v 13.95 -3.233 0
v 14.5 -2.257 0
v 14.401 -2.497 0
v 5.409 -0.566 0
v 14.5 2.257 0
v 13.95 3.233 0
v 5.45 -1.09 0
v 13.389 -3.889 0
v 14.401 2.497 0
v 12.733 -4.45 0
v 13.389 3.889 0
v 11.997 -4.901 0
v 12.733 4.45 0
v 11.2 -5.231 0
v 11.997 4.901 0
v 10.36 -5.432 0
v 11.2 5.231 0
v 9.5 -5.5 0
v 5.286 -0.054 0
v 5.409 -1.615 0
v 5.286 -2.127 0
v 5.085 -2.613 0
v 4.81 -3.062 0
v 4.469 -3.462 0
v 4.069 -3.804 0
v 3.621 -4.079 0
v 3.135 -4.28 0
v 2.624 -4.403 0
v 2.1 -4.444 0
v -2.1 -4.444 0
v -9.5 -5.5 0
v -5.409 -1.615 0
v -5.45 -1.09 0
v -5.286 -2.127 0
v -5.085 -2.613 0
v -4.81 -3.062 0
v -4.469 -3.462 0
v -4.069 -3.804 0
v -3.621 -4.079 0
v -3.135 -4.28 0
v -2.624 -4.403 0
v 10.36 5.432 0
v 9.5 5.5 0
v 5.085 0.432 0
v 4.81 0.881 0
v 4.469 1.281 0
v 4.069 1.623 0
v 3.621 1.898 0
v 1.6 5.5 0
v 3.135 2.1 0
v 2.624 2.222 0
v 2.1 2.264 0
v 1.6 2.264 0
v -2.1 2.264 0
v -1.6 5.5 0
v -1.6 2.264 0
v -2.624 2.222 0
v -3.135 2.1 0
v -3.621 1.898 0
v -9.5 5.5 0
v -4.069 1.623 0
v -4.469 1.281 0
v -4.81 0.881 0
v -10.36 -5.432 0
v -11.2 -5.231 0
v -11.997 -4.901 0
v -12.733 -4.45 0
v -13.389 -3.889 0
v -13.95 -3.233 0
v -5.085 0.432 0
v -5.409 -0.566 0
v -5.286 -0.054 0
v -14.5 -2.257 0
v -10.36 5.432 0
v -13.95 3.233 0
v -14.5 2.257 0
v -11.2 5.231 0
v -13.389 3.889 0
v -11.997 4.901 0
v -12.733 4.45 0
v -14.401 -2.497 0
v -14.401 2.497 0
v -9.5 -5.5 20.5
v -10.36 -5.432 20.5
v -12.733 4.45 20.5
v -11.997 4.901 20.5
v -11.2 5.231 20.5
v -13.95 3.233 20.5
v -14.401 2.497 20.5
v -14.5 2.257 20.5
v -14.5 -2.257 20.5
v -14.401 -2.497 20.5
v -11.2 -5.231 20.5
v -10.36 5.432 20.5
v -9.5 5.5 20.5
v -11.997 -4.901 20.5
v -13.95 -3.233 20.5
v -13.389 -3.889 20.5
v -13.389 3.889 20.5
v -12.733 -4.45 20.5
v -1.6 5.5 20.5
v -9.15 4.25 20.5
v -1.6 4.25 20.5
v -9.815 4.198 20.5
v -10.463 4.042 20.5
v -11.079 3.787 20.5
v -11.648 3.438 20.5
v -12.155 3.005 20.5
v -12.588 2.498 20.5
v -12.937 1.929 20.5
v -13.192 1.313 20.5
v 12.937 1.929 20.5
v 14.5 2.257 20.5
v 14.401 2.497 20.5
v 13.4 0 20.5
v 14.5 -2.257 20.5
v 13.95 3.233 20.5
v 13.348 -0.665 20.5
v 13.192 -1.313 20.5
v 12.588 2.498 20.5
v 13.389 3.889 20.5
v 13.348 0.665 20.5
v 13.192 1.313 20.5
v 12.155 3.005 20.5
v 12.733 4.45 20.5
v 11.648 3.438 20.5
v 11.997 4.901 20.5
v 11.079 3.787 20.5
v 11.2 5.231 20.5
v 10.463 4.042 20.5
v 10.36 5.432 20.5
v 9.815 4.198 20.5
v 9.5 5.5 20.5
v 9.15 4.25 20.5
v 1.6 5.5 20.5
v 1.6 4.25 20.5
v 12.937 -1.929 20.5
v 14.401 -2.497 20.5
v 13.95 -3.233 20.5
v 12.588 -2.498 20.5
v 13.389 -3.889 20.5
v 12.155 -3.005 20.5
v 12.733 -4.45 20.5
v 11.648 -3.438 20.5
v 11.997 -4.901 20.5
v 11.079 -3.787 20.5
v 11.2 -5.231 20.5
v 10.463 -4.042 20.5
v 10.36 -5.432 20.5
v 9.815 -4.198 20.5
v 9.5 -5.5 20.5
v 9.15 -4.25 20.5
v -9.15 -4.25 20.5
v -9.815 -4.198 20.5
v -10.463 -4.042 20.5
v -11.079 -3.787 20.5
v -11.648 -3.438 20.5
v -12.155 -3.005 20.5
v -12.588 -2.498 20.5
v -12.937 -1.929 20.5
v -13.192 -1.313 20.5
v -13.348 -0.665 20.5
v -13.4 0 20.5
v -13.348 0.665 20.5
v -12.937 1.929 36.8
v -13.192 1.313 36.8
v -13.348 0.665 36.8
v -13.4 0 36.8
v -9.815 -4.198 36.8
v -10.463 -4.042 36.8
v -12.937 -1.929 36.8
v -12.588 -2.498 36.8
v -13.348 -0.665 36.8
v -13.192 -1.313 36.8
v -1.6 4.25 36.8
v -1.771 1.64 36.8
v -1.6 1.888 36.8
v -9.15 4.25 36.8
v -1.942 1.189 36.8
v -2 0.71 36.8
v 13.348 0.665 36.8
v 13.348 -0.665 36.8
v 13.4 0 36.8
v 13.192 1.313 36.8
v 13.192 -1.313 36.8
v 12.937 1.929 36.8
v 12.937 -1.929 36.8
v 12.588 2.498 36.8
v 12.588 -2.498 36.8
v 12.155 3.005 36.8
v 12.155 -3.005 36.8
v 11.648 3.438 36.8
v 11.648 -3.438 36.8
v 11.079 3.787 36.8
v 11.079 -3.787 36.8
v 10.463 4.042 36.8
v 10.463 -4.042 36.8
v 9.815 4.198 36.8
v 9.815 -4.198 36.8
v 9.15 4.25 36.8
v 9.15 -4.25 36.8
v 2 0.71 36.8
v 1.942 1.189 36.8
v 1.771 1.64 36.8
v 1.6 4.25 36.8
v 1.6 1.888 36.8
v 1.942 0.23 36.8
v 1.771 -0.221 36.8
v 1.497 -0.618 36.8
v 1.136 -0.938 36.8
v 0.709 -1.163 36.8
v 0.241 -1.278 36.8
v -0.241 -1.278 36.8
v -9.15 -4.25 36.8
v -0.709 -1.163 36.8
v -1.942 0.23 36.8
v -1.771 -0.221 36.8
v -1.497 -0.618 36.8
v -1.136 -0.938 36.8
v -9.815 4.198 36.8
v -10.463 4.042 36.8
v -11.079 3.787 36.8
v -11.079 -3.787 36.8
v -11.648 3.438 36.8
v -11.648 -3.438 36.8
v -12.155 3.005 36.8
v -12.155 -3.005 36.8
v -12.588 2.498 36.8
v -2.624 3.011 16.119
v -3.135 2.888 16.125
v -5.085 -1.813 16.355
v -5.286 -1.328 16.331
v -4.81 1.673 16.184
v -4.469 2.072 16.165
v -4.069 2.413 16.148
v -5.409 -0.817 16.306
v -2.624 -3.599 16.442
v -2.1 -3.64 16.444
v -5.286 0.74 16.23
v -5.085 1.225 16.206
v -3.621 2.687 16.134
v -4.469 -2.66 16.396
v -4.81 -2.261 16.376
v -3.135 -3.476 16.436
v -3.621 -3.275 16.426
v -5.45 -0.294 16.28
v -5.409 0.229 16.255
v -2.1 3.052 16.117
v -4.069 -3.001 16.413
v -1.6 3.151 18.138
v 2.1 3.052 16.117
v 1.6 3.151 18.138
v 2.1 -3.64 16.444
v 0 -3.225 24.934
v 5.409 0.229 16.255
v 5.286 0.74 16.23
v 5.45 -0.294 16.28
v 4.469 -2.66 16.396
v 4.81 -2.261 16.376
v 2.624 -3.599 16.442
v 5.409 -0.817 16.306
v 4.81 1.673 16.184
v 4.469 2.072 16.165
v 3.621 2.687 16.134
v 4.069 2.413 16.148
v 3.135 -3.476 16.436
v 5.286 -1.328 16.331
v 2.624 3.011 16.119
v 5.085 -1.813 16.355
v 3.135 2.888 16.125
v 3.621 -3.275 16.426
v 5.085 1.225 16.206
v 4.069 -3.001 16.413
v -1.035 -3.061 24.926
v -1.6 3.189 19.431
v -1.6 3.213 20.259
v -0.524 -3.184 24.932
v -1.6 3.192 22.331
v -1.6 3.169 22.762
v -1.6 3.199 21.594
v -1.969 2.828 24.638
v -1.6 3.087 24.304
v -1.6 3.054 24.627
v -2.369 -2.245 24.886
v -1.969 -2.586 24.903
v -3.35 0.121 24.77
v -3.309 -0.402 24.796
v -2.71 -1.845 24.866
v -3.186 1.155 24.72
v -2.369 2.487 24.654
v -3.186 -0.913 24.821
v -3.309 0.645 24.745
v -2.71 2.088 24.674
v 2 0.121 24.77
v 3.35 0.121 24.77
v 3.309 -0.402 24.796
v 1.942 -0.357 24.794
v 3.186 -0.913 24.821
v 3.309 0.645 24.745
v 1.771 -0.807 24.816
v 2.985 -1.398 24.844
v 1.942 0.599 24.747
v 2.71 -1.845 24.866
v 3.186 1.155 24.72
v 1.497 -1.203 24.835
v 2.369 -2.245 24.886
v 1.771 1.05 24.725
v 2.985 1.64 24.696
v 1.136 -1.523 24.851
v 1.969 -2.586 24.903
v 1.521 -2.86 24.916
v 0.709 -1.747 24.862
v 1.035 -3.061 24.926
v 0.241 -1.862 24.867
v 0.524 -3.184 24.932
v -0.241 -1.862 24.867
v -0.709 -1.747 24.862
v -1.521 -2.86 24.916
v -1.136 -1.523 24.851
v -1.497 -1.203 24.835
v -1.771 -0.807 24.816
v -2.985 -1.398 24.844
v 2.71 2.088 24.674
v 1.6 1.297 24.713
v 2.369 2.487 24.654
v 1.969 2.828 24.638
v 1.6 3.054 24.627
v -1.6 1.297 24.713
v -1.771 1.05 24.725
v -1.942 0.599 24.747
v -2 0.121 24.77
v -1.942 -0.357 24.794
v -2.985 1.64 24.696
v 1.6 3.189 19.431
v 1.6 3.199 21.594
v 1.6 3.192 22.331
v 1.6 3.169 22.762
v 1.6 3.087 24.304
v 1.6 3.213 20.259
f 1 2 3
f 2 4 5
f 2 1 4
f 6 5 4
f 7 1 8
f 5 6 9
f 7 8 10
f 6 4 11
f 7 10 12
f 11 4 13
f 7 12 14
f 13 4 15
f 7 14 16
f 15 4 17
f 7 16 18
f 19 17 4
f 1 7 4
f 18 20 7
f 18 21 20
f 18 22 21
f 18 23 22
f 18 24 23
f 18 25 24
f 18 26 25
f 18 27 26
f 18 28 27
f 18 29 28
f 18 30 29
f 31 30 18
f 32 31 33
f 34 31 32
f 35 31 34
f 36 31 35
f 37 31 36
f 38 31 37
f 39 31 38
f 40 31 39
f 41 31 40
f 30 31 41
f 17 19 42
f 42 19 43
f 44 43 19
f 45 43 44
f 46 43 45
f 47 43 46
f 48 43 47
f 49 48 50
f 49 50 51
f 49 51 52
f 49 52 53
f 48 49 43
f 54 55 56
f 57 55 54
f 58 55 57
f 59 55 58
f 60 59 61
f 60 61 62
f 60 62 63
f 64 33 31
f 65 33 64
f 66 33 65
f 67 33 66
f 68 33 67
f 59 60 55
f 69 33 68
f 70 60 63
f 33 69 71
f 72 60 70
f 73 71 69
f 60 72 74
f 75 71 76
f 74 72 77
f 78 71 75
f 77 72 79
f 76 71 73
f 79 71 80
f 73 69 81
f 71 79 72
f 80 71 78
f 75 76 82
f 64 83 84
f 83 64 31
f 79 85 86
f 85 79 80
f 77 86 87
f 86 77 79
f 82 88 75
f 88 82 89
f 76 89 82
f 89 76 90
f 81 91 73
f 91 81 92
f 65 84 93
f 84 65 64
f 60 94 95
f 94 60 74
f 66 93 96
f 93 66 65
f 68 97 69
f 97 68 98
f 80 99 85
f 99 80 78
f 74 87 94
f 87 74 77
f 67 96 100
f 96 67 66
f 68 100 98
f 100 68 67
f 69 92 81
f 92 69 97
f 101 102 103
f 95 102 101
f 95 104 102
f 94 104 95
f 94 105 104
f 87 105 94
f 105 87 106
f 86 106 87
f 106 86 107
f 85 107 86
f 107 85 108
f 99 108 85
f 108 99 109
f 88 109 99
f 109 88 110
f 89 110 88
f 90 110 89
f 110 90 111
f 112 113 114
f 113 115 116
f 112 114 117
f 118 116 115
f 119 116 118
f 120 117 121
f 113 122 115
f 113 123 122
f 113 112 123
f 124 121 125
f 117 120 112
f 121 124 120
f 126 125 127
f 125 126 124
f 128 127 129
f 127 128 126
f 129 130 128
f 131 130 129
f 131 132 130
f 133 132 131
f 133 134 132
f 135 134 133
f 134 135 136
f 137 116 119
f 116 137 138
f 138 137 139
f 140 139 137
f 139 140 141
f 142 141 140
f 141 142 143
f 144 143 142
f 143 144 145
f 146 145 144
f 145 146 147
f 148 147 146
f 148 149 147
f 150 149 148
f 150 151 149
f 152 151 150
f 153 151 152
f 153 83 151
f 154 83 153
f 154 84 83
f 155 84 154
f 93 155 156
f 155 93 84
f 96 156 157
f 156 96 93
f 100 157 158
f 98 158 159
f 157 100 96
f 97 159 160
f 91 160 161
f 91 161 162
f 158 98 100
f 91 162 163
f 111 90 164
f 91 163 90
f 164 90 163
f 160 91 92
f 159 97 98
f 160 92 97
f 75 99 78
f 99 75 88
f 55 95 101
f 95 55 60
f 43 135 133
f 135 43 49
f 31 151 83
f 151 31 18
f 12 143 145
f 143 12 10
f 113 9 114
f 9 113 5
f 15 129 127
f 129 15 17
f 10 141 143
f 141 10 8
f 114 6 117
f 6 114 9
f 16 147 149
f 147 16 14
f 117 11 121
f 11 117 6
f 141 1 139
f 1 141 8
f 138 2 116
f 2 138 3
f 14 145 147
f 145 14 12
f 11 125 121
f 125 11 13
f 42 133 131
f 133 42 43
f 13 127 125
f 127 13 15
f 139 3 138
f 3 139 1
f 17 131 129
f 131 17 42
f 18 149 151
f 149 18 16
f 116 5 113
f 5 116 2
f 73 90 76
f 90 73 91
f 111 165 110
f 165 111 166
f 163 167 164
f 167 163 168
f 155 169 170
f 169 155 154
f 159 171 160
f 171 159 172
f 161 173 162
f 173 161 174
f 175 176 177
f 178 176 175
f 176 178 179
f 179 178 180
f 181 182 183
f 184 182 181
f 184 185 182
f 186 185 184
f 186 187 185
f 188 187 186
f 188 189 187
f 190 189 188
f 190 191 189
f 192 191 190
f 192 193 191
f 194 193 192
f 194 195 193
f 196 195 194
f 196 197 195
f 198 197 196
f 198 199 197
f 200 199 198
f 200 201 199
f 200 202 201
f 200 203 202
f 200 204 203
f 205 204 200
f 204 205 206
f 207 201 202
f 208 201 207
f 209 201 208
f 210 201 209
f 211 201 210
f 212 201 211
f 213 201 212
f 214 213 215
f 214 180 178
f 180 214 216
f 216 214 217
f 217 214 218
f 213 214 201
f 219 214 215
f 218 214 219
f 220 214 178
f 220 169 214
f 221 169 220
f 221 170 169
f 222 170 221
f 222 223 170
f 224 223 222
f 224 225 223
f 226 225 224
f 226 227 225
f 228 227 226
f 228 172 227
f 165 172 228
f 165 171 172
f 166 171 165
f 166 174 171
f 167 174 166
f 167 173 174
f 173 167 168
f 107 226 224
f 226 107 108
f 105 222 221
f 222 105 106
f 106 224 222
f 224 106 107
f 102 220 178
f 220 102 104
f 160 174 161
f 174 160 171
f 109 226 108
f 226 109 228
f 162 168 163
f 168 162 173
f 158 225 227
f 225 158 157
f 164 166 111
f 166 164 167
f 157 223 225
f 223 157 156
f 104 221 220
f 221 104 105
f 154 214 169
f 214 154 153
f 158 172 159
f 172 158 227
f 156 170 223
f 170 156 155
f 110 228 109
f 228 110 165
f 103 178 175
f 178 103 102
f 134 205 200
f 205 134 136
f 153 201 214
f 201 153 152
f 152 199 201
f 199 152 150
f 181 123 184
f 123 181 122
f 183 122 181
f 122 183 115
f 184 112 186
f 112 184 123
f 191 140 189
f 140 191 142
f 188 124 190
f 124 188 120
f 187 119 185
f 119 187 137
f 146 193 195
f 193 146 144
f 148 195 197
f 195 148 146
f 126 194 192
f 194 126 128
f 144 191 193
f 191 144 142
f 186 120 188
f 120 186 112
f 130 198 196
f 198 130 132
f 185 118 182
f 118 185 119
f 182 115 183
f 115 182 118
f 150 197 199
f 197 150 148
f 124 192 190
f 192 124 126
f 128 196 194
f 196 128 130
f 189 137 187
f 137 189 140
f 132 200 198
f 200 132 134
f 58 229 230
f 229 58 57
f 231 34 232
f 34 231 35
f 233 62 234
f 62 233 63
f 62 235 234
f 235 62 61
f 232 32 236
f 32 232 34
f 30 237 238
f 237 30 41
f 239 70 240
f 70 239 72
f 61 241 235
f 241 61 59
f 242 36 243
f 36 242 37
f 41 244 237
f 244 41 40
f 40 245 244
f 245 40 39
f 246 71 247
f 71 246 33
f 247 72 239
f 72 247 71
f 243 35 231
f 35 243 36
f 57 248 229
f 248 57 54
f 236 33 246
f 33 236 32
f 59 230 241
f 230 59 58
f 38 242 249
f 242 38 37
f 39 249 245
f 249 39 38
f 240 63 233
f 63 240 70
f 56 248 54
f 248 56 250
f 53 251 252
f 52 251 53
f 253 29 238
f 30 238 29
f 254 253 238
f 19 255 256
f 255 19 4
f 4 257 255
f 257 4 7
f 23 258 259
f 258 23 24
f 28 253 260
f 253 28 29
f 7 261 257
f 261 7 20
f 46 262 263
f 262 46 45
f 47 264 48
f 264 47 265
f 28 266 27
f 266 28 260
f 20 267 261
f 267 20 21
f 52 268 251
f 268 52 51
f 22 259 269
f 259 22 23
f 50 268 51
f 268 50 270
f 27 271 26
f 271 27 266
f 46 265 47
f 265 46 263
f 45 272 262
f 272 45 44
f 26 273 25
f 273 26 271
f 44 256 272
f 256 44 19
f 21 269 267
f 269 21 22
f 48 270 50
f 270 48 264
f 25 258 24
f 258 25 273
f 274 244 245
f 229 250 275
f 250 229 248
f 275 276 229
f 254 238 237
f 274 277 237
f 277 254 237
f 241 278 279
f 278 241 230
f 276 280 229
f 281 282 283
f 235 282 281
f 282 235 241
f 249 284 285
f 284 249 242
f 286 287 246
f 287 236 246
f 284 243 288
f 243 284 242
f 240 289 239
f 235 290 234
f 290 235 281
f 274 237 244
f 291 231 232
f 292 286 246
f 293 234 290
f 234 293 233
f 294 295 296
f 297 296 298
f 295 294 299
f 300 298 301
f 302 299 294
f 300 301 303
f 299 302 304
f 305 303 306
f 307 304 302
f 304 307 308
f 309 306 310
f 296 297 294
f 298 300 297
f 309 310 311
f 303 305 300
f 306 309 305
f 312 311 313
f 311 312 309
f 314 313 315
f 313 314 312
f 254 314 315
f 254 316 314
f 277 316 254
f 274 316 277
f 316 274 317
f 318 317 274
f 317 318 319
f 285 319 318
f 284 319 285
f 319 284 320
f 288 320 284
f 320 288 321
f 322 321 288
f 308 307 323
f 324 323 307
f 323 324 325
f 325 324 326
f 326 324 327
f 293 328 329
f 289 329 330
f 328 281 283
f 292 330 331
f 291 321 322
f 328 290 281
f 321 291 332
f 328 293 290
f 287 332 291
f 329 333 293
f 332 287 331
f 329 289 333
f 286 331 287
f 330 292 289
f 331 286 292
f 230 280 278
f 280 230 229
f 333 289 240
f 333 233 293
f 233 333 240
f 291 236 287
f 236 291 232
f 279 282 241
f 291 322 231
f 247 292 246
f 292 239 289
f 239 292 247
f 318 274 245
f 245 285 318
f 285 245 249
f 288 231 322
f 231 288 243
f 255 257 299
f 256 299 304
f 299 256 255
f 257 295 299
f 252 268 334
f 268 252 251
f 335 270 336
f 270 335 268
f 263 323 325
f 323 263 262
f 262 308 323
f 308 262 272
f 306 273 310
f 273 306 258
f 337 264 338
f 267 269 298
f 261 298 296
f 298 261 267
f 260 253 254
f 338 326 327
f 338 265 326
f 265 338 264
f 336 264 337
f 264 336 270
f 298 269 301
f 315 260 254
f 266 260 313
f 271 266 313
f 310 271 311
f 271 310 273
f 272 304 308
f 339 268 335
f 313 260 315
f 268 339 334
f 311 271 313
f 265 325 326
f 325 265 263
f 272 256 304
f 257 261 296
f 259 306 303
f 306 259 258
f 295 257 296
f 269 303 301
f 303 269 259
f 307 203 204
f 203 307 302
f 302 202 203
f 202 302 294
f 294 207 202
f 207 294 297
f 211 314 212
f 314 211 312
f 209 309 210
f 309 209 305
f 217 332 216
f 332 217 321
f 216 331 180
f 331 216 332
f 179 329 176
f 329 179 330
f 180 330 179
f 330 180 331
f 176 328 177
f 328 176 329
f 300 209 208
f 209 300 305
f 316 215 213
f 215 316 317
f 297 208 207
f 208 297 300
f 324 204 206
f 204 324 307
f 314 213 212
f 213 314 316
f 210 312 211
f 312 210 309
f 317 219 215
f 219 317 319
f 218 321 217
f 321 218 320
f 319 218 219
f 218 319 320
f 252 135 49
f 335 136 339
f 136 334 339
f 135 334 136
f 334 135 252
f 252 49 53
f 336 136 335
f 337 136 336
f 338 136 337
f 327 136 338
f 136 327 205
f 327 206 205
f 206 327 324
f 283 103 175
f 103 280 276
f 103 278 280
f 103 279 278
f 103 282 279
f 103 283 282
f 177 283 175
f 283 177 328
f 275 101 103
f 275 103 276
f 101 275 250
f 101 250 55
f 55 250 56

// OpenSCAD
$fa = 9;
$fs = 0.5;


// Gap for cut out objects
gap = 0.25; //[0 : 1]

lowerShaftHeight = 16.3;
lowerShaftLength=26.8;
lowerShaftWidth=8.5;


upperShaftHeight = 20.5;
upperShaftWidth = 11;
upperShaftLength = 30;

totalHeight = upperShaftHeight + lowerShaftHeight;

usbheight = 16.5;
usbwidth = 6.7;
usblength = 10.9;

usbCableEndDiameter = usbwidth;
usbCableSocketHeight = 8.5;

cableDiameter = 4;
trenchWidth = cableDiameter * .8;

module skew(x = 0, y = 0) {
    multmatrix([
    [ 1, 0, x, 0],
    [ 0, 1, y, 0],
    [ 0, 0, 1, 0],
    [ 0, 0, 0, 1]]) children();
}

module shaft(height = 10, width = 10, length = 20) {
    translate([(length - width) / -2, 0, 0])
        cylinder(height, r = width / 2);
    translate([0, 0, height / 2])    
        cube([length - width, width, height], center = true);
    translate([(length - width) / 2, 0, 0])
        cylinder(height, r = width / 2);
}

module usb() {
    color("red") {
        shaft(usbheight, usbwidth, usblength);
        
        translate([0, 0, usbheight]) {
            
            skew = (usblength - usbCableEndDiameter) / 2;
            
            translate([0, usbCableEndDiameter / 2, 0])
            rotate([90,0,0])
                linear_extrude(usbCableEndDiameter)
                    polygon(points = [[0, usbCableSocketHeight], [-skew, 0], [skew,0]] );

            
            translate([(usblength - usbCableEndDiameter) / -2, 0, 0])
                skew(x = skew / usbCableSocketHeight) cylinder(h = usbCableSocketHeight, r = usbCableEndDiameter / 2);

            translate([(usblength - usbCableEndDiameter) / 2, 0, 0])
                skew(x = skew / -usbCableSocketHeight) cylinder(h = usbCableSocketHeight, r = usbCableEndDiameter / 2);
            
            
            translate([0, 0, usbCableSocketHeight]) {
                cylinder(r = cableDiameter / 2, h = 30);
            }
        }
        
        
    }
}

module snapShaft(h = 10, w = 4, thickness = 1, extent = 1, gap = 1, inset = 0) {
    
    rearGap = gap / 2+ extent;
    
    mirror([0, 0, 1])
    translate([w / -2, inset, 0]) {
        difference() {
            
            translate([-gap, -gap, 0]) cube([w + 2*gap, thickness + gap + rearGap, h]);
            
            cube([w, thickness, h]);

        }
        
        if (inset > 0) {
            translate([-gap, -inset, 0])
            cube([w + 2 * gap, inset - gap, gap]);
        }
    
    }
}

    snapGap = .9;
    snapWidth = 4;
    snapExtend = 1;
    snapThickness = 1.2;
    snapInset = 0.8;


module cutout() {
    translate([0, -1.1, -.2])
    rotate([-2.8, 0, 0])  {
   #usb();
    
        
    translate([trenchWidth / -2, 0, 0])
        cube([trenchWidth, upperShaftWidth, totalHeight * 1.1]);
    }
    

    *snapTransformation() {
               snapShaft(h = lowerShaftHeight, w = snapWidth, extent = snapExtend, inset = snapInset, gap = snapGap, thickness = snapThickness);
                        
    }
}

module mirrorCopy(pane) {
    children();
    mirror(pane) children();
}

module snapTransformation() {
    rotate([0, 0, -90])
    mirrorCopy([0, 1,0])
        translate([0, lowerShaftLength / -2, totalHeight]) {
                children();
            }
}

module body() {
        intersection() {
            shaft(upperShaftHeight, upperShaftWidth, upperShaftLength);
            cube([upperShaftLength - 1, upperShaftWidth, upperShaftHeight * 2], center = true);
        }
        
        translate([0, 0, upperShaftHeight]) {
            color ("green") shaft(lowerShaftHeight, lowerShaftWidth, lowerShaftLength);
            
        }

    *snapTransformation() {
        translate([snapWidth / -2, -snapExtend, 0]) {
            intersection() {
                cube([snapWidth, snapExtend + snapInset + snapThickness, snapThickness]);
                translate([snapWidth / 2, lowerShaftWidth / 2, 0]) cylinder(r = lowerShaftWidth / 2, h =snapThickness);
            }
        }
        
   }

}

module torus(rr = 10, rb = 1, angle=360) {
    rotate_extrude(angle = angle) {
        translate([rr, 0, 0]) circle(r = rb);
    }
}

module clip() {
    
    clipHeight = cableDiameter + 4;
    cableRadius = cableDiameter / 2;
    clipLength = upperShaftLength;
    clipWidth = upperShaftWidth;
    
    tunnelRadius = 1.5* cableDiameter;
    
    difference() {
        union() {
            difference() {
                shaft(clipHeight, clipWidth, clipLength);
                
            
            cylinder(h = clipHeight, r = cableRadius);
            
            rotate([0, 0, 47])
            translate([-clipLength / 2, 0, clipHeight / 2])
                cube([clipLength, clipLength, clipHeight]);
            
           
            }
        
            supportRadius = (tunnelRadius - cableDiameter) / 2;
        
        
            translate([0, 0, clipHeight / 2])
                rotate([0, 0, 45])
                    torus(rr = supportRadius + cableRadius, rb = supportRadius, angle = 225);
        }
    
        translate([0, 0, clipHeight / 2])
            torus(rr = tunnelRadius, rb = cableRadius);

        translate([0, trenchWidth / -2, 0])
            rotate([0, 0, -12])
                cube([clipLength / 2, trenchWidth, clipHeight]);
        
        translate([0, 0, clipHeight / 2])
            difference() {
                
                cylinder(r = tunnelRadius + cableRadius, h = clipHeight / 2);
                cylinder(r = tunnelRadius + cableRadius - trenchWidth, h = clipHeight / 2);
                
            }

    }
    
}

!difference() {
    body();

    cutout();
    }
    
clip();


            
